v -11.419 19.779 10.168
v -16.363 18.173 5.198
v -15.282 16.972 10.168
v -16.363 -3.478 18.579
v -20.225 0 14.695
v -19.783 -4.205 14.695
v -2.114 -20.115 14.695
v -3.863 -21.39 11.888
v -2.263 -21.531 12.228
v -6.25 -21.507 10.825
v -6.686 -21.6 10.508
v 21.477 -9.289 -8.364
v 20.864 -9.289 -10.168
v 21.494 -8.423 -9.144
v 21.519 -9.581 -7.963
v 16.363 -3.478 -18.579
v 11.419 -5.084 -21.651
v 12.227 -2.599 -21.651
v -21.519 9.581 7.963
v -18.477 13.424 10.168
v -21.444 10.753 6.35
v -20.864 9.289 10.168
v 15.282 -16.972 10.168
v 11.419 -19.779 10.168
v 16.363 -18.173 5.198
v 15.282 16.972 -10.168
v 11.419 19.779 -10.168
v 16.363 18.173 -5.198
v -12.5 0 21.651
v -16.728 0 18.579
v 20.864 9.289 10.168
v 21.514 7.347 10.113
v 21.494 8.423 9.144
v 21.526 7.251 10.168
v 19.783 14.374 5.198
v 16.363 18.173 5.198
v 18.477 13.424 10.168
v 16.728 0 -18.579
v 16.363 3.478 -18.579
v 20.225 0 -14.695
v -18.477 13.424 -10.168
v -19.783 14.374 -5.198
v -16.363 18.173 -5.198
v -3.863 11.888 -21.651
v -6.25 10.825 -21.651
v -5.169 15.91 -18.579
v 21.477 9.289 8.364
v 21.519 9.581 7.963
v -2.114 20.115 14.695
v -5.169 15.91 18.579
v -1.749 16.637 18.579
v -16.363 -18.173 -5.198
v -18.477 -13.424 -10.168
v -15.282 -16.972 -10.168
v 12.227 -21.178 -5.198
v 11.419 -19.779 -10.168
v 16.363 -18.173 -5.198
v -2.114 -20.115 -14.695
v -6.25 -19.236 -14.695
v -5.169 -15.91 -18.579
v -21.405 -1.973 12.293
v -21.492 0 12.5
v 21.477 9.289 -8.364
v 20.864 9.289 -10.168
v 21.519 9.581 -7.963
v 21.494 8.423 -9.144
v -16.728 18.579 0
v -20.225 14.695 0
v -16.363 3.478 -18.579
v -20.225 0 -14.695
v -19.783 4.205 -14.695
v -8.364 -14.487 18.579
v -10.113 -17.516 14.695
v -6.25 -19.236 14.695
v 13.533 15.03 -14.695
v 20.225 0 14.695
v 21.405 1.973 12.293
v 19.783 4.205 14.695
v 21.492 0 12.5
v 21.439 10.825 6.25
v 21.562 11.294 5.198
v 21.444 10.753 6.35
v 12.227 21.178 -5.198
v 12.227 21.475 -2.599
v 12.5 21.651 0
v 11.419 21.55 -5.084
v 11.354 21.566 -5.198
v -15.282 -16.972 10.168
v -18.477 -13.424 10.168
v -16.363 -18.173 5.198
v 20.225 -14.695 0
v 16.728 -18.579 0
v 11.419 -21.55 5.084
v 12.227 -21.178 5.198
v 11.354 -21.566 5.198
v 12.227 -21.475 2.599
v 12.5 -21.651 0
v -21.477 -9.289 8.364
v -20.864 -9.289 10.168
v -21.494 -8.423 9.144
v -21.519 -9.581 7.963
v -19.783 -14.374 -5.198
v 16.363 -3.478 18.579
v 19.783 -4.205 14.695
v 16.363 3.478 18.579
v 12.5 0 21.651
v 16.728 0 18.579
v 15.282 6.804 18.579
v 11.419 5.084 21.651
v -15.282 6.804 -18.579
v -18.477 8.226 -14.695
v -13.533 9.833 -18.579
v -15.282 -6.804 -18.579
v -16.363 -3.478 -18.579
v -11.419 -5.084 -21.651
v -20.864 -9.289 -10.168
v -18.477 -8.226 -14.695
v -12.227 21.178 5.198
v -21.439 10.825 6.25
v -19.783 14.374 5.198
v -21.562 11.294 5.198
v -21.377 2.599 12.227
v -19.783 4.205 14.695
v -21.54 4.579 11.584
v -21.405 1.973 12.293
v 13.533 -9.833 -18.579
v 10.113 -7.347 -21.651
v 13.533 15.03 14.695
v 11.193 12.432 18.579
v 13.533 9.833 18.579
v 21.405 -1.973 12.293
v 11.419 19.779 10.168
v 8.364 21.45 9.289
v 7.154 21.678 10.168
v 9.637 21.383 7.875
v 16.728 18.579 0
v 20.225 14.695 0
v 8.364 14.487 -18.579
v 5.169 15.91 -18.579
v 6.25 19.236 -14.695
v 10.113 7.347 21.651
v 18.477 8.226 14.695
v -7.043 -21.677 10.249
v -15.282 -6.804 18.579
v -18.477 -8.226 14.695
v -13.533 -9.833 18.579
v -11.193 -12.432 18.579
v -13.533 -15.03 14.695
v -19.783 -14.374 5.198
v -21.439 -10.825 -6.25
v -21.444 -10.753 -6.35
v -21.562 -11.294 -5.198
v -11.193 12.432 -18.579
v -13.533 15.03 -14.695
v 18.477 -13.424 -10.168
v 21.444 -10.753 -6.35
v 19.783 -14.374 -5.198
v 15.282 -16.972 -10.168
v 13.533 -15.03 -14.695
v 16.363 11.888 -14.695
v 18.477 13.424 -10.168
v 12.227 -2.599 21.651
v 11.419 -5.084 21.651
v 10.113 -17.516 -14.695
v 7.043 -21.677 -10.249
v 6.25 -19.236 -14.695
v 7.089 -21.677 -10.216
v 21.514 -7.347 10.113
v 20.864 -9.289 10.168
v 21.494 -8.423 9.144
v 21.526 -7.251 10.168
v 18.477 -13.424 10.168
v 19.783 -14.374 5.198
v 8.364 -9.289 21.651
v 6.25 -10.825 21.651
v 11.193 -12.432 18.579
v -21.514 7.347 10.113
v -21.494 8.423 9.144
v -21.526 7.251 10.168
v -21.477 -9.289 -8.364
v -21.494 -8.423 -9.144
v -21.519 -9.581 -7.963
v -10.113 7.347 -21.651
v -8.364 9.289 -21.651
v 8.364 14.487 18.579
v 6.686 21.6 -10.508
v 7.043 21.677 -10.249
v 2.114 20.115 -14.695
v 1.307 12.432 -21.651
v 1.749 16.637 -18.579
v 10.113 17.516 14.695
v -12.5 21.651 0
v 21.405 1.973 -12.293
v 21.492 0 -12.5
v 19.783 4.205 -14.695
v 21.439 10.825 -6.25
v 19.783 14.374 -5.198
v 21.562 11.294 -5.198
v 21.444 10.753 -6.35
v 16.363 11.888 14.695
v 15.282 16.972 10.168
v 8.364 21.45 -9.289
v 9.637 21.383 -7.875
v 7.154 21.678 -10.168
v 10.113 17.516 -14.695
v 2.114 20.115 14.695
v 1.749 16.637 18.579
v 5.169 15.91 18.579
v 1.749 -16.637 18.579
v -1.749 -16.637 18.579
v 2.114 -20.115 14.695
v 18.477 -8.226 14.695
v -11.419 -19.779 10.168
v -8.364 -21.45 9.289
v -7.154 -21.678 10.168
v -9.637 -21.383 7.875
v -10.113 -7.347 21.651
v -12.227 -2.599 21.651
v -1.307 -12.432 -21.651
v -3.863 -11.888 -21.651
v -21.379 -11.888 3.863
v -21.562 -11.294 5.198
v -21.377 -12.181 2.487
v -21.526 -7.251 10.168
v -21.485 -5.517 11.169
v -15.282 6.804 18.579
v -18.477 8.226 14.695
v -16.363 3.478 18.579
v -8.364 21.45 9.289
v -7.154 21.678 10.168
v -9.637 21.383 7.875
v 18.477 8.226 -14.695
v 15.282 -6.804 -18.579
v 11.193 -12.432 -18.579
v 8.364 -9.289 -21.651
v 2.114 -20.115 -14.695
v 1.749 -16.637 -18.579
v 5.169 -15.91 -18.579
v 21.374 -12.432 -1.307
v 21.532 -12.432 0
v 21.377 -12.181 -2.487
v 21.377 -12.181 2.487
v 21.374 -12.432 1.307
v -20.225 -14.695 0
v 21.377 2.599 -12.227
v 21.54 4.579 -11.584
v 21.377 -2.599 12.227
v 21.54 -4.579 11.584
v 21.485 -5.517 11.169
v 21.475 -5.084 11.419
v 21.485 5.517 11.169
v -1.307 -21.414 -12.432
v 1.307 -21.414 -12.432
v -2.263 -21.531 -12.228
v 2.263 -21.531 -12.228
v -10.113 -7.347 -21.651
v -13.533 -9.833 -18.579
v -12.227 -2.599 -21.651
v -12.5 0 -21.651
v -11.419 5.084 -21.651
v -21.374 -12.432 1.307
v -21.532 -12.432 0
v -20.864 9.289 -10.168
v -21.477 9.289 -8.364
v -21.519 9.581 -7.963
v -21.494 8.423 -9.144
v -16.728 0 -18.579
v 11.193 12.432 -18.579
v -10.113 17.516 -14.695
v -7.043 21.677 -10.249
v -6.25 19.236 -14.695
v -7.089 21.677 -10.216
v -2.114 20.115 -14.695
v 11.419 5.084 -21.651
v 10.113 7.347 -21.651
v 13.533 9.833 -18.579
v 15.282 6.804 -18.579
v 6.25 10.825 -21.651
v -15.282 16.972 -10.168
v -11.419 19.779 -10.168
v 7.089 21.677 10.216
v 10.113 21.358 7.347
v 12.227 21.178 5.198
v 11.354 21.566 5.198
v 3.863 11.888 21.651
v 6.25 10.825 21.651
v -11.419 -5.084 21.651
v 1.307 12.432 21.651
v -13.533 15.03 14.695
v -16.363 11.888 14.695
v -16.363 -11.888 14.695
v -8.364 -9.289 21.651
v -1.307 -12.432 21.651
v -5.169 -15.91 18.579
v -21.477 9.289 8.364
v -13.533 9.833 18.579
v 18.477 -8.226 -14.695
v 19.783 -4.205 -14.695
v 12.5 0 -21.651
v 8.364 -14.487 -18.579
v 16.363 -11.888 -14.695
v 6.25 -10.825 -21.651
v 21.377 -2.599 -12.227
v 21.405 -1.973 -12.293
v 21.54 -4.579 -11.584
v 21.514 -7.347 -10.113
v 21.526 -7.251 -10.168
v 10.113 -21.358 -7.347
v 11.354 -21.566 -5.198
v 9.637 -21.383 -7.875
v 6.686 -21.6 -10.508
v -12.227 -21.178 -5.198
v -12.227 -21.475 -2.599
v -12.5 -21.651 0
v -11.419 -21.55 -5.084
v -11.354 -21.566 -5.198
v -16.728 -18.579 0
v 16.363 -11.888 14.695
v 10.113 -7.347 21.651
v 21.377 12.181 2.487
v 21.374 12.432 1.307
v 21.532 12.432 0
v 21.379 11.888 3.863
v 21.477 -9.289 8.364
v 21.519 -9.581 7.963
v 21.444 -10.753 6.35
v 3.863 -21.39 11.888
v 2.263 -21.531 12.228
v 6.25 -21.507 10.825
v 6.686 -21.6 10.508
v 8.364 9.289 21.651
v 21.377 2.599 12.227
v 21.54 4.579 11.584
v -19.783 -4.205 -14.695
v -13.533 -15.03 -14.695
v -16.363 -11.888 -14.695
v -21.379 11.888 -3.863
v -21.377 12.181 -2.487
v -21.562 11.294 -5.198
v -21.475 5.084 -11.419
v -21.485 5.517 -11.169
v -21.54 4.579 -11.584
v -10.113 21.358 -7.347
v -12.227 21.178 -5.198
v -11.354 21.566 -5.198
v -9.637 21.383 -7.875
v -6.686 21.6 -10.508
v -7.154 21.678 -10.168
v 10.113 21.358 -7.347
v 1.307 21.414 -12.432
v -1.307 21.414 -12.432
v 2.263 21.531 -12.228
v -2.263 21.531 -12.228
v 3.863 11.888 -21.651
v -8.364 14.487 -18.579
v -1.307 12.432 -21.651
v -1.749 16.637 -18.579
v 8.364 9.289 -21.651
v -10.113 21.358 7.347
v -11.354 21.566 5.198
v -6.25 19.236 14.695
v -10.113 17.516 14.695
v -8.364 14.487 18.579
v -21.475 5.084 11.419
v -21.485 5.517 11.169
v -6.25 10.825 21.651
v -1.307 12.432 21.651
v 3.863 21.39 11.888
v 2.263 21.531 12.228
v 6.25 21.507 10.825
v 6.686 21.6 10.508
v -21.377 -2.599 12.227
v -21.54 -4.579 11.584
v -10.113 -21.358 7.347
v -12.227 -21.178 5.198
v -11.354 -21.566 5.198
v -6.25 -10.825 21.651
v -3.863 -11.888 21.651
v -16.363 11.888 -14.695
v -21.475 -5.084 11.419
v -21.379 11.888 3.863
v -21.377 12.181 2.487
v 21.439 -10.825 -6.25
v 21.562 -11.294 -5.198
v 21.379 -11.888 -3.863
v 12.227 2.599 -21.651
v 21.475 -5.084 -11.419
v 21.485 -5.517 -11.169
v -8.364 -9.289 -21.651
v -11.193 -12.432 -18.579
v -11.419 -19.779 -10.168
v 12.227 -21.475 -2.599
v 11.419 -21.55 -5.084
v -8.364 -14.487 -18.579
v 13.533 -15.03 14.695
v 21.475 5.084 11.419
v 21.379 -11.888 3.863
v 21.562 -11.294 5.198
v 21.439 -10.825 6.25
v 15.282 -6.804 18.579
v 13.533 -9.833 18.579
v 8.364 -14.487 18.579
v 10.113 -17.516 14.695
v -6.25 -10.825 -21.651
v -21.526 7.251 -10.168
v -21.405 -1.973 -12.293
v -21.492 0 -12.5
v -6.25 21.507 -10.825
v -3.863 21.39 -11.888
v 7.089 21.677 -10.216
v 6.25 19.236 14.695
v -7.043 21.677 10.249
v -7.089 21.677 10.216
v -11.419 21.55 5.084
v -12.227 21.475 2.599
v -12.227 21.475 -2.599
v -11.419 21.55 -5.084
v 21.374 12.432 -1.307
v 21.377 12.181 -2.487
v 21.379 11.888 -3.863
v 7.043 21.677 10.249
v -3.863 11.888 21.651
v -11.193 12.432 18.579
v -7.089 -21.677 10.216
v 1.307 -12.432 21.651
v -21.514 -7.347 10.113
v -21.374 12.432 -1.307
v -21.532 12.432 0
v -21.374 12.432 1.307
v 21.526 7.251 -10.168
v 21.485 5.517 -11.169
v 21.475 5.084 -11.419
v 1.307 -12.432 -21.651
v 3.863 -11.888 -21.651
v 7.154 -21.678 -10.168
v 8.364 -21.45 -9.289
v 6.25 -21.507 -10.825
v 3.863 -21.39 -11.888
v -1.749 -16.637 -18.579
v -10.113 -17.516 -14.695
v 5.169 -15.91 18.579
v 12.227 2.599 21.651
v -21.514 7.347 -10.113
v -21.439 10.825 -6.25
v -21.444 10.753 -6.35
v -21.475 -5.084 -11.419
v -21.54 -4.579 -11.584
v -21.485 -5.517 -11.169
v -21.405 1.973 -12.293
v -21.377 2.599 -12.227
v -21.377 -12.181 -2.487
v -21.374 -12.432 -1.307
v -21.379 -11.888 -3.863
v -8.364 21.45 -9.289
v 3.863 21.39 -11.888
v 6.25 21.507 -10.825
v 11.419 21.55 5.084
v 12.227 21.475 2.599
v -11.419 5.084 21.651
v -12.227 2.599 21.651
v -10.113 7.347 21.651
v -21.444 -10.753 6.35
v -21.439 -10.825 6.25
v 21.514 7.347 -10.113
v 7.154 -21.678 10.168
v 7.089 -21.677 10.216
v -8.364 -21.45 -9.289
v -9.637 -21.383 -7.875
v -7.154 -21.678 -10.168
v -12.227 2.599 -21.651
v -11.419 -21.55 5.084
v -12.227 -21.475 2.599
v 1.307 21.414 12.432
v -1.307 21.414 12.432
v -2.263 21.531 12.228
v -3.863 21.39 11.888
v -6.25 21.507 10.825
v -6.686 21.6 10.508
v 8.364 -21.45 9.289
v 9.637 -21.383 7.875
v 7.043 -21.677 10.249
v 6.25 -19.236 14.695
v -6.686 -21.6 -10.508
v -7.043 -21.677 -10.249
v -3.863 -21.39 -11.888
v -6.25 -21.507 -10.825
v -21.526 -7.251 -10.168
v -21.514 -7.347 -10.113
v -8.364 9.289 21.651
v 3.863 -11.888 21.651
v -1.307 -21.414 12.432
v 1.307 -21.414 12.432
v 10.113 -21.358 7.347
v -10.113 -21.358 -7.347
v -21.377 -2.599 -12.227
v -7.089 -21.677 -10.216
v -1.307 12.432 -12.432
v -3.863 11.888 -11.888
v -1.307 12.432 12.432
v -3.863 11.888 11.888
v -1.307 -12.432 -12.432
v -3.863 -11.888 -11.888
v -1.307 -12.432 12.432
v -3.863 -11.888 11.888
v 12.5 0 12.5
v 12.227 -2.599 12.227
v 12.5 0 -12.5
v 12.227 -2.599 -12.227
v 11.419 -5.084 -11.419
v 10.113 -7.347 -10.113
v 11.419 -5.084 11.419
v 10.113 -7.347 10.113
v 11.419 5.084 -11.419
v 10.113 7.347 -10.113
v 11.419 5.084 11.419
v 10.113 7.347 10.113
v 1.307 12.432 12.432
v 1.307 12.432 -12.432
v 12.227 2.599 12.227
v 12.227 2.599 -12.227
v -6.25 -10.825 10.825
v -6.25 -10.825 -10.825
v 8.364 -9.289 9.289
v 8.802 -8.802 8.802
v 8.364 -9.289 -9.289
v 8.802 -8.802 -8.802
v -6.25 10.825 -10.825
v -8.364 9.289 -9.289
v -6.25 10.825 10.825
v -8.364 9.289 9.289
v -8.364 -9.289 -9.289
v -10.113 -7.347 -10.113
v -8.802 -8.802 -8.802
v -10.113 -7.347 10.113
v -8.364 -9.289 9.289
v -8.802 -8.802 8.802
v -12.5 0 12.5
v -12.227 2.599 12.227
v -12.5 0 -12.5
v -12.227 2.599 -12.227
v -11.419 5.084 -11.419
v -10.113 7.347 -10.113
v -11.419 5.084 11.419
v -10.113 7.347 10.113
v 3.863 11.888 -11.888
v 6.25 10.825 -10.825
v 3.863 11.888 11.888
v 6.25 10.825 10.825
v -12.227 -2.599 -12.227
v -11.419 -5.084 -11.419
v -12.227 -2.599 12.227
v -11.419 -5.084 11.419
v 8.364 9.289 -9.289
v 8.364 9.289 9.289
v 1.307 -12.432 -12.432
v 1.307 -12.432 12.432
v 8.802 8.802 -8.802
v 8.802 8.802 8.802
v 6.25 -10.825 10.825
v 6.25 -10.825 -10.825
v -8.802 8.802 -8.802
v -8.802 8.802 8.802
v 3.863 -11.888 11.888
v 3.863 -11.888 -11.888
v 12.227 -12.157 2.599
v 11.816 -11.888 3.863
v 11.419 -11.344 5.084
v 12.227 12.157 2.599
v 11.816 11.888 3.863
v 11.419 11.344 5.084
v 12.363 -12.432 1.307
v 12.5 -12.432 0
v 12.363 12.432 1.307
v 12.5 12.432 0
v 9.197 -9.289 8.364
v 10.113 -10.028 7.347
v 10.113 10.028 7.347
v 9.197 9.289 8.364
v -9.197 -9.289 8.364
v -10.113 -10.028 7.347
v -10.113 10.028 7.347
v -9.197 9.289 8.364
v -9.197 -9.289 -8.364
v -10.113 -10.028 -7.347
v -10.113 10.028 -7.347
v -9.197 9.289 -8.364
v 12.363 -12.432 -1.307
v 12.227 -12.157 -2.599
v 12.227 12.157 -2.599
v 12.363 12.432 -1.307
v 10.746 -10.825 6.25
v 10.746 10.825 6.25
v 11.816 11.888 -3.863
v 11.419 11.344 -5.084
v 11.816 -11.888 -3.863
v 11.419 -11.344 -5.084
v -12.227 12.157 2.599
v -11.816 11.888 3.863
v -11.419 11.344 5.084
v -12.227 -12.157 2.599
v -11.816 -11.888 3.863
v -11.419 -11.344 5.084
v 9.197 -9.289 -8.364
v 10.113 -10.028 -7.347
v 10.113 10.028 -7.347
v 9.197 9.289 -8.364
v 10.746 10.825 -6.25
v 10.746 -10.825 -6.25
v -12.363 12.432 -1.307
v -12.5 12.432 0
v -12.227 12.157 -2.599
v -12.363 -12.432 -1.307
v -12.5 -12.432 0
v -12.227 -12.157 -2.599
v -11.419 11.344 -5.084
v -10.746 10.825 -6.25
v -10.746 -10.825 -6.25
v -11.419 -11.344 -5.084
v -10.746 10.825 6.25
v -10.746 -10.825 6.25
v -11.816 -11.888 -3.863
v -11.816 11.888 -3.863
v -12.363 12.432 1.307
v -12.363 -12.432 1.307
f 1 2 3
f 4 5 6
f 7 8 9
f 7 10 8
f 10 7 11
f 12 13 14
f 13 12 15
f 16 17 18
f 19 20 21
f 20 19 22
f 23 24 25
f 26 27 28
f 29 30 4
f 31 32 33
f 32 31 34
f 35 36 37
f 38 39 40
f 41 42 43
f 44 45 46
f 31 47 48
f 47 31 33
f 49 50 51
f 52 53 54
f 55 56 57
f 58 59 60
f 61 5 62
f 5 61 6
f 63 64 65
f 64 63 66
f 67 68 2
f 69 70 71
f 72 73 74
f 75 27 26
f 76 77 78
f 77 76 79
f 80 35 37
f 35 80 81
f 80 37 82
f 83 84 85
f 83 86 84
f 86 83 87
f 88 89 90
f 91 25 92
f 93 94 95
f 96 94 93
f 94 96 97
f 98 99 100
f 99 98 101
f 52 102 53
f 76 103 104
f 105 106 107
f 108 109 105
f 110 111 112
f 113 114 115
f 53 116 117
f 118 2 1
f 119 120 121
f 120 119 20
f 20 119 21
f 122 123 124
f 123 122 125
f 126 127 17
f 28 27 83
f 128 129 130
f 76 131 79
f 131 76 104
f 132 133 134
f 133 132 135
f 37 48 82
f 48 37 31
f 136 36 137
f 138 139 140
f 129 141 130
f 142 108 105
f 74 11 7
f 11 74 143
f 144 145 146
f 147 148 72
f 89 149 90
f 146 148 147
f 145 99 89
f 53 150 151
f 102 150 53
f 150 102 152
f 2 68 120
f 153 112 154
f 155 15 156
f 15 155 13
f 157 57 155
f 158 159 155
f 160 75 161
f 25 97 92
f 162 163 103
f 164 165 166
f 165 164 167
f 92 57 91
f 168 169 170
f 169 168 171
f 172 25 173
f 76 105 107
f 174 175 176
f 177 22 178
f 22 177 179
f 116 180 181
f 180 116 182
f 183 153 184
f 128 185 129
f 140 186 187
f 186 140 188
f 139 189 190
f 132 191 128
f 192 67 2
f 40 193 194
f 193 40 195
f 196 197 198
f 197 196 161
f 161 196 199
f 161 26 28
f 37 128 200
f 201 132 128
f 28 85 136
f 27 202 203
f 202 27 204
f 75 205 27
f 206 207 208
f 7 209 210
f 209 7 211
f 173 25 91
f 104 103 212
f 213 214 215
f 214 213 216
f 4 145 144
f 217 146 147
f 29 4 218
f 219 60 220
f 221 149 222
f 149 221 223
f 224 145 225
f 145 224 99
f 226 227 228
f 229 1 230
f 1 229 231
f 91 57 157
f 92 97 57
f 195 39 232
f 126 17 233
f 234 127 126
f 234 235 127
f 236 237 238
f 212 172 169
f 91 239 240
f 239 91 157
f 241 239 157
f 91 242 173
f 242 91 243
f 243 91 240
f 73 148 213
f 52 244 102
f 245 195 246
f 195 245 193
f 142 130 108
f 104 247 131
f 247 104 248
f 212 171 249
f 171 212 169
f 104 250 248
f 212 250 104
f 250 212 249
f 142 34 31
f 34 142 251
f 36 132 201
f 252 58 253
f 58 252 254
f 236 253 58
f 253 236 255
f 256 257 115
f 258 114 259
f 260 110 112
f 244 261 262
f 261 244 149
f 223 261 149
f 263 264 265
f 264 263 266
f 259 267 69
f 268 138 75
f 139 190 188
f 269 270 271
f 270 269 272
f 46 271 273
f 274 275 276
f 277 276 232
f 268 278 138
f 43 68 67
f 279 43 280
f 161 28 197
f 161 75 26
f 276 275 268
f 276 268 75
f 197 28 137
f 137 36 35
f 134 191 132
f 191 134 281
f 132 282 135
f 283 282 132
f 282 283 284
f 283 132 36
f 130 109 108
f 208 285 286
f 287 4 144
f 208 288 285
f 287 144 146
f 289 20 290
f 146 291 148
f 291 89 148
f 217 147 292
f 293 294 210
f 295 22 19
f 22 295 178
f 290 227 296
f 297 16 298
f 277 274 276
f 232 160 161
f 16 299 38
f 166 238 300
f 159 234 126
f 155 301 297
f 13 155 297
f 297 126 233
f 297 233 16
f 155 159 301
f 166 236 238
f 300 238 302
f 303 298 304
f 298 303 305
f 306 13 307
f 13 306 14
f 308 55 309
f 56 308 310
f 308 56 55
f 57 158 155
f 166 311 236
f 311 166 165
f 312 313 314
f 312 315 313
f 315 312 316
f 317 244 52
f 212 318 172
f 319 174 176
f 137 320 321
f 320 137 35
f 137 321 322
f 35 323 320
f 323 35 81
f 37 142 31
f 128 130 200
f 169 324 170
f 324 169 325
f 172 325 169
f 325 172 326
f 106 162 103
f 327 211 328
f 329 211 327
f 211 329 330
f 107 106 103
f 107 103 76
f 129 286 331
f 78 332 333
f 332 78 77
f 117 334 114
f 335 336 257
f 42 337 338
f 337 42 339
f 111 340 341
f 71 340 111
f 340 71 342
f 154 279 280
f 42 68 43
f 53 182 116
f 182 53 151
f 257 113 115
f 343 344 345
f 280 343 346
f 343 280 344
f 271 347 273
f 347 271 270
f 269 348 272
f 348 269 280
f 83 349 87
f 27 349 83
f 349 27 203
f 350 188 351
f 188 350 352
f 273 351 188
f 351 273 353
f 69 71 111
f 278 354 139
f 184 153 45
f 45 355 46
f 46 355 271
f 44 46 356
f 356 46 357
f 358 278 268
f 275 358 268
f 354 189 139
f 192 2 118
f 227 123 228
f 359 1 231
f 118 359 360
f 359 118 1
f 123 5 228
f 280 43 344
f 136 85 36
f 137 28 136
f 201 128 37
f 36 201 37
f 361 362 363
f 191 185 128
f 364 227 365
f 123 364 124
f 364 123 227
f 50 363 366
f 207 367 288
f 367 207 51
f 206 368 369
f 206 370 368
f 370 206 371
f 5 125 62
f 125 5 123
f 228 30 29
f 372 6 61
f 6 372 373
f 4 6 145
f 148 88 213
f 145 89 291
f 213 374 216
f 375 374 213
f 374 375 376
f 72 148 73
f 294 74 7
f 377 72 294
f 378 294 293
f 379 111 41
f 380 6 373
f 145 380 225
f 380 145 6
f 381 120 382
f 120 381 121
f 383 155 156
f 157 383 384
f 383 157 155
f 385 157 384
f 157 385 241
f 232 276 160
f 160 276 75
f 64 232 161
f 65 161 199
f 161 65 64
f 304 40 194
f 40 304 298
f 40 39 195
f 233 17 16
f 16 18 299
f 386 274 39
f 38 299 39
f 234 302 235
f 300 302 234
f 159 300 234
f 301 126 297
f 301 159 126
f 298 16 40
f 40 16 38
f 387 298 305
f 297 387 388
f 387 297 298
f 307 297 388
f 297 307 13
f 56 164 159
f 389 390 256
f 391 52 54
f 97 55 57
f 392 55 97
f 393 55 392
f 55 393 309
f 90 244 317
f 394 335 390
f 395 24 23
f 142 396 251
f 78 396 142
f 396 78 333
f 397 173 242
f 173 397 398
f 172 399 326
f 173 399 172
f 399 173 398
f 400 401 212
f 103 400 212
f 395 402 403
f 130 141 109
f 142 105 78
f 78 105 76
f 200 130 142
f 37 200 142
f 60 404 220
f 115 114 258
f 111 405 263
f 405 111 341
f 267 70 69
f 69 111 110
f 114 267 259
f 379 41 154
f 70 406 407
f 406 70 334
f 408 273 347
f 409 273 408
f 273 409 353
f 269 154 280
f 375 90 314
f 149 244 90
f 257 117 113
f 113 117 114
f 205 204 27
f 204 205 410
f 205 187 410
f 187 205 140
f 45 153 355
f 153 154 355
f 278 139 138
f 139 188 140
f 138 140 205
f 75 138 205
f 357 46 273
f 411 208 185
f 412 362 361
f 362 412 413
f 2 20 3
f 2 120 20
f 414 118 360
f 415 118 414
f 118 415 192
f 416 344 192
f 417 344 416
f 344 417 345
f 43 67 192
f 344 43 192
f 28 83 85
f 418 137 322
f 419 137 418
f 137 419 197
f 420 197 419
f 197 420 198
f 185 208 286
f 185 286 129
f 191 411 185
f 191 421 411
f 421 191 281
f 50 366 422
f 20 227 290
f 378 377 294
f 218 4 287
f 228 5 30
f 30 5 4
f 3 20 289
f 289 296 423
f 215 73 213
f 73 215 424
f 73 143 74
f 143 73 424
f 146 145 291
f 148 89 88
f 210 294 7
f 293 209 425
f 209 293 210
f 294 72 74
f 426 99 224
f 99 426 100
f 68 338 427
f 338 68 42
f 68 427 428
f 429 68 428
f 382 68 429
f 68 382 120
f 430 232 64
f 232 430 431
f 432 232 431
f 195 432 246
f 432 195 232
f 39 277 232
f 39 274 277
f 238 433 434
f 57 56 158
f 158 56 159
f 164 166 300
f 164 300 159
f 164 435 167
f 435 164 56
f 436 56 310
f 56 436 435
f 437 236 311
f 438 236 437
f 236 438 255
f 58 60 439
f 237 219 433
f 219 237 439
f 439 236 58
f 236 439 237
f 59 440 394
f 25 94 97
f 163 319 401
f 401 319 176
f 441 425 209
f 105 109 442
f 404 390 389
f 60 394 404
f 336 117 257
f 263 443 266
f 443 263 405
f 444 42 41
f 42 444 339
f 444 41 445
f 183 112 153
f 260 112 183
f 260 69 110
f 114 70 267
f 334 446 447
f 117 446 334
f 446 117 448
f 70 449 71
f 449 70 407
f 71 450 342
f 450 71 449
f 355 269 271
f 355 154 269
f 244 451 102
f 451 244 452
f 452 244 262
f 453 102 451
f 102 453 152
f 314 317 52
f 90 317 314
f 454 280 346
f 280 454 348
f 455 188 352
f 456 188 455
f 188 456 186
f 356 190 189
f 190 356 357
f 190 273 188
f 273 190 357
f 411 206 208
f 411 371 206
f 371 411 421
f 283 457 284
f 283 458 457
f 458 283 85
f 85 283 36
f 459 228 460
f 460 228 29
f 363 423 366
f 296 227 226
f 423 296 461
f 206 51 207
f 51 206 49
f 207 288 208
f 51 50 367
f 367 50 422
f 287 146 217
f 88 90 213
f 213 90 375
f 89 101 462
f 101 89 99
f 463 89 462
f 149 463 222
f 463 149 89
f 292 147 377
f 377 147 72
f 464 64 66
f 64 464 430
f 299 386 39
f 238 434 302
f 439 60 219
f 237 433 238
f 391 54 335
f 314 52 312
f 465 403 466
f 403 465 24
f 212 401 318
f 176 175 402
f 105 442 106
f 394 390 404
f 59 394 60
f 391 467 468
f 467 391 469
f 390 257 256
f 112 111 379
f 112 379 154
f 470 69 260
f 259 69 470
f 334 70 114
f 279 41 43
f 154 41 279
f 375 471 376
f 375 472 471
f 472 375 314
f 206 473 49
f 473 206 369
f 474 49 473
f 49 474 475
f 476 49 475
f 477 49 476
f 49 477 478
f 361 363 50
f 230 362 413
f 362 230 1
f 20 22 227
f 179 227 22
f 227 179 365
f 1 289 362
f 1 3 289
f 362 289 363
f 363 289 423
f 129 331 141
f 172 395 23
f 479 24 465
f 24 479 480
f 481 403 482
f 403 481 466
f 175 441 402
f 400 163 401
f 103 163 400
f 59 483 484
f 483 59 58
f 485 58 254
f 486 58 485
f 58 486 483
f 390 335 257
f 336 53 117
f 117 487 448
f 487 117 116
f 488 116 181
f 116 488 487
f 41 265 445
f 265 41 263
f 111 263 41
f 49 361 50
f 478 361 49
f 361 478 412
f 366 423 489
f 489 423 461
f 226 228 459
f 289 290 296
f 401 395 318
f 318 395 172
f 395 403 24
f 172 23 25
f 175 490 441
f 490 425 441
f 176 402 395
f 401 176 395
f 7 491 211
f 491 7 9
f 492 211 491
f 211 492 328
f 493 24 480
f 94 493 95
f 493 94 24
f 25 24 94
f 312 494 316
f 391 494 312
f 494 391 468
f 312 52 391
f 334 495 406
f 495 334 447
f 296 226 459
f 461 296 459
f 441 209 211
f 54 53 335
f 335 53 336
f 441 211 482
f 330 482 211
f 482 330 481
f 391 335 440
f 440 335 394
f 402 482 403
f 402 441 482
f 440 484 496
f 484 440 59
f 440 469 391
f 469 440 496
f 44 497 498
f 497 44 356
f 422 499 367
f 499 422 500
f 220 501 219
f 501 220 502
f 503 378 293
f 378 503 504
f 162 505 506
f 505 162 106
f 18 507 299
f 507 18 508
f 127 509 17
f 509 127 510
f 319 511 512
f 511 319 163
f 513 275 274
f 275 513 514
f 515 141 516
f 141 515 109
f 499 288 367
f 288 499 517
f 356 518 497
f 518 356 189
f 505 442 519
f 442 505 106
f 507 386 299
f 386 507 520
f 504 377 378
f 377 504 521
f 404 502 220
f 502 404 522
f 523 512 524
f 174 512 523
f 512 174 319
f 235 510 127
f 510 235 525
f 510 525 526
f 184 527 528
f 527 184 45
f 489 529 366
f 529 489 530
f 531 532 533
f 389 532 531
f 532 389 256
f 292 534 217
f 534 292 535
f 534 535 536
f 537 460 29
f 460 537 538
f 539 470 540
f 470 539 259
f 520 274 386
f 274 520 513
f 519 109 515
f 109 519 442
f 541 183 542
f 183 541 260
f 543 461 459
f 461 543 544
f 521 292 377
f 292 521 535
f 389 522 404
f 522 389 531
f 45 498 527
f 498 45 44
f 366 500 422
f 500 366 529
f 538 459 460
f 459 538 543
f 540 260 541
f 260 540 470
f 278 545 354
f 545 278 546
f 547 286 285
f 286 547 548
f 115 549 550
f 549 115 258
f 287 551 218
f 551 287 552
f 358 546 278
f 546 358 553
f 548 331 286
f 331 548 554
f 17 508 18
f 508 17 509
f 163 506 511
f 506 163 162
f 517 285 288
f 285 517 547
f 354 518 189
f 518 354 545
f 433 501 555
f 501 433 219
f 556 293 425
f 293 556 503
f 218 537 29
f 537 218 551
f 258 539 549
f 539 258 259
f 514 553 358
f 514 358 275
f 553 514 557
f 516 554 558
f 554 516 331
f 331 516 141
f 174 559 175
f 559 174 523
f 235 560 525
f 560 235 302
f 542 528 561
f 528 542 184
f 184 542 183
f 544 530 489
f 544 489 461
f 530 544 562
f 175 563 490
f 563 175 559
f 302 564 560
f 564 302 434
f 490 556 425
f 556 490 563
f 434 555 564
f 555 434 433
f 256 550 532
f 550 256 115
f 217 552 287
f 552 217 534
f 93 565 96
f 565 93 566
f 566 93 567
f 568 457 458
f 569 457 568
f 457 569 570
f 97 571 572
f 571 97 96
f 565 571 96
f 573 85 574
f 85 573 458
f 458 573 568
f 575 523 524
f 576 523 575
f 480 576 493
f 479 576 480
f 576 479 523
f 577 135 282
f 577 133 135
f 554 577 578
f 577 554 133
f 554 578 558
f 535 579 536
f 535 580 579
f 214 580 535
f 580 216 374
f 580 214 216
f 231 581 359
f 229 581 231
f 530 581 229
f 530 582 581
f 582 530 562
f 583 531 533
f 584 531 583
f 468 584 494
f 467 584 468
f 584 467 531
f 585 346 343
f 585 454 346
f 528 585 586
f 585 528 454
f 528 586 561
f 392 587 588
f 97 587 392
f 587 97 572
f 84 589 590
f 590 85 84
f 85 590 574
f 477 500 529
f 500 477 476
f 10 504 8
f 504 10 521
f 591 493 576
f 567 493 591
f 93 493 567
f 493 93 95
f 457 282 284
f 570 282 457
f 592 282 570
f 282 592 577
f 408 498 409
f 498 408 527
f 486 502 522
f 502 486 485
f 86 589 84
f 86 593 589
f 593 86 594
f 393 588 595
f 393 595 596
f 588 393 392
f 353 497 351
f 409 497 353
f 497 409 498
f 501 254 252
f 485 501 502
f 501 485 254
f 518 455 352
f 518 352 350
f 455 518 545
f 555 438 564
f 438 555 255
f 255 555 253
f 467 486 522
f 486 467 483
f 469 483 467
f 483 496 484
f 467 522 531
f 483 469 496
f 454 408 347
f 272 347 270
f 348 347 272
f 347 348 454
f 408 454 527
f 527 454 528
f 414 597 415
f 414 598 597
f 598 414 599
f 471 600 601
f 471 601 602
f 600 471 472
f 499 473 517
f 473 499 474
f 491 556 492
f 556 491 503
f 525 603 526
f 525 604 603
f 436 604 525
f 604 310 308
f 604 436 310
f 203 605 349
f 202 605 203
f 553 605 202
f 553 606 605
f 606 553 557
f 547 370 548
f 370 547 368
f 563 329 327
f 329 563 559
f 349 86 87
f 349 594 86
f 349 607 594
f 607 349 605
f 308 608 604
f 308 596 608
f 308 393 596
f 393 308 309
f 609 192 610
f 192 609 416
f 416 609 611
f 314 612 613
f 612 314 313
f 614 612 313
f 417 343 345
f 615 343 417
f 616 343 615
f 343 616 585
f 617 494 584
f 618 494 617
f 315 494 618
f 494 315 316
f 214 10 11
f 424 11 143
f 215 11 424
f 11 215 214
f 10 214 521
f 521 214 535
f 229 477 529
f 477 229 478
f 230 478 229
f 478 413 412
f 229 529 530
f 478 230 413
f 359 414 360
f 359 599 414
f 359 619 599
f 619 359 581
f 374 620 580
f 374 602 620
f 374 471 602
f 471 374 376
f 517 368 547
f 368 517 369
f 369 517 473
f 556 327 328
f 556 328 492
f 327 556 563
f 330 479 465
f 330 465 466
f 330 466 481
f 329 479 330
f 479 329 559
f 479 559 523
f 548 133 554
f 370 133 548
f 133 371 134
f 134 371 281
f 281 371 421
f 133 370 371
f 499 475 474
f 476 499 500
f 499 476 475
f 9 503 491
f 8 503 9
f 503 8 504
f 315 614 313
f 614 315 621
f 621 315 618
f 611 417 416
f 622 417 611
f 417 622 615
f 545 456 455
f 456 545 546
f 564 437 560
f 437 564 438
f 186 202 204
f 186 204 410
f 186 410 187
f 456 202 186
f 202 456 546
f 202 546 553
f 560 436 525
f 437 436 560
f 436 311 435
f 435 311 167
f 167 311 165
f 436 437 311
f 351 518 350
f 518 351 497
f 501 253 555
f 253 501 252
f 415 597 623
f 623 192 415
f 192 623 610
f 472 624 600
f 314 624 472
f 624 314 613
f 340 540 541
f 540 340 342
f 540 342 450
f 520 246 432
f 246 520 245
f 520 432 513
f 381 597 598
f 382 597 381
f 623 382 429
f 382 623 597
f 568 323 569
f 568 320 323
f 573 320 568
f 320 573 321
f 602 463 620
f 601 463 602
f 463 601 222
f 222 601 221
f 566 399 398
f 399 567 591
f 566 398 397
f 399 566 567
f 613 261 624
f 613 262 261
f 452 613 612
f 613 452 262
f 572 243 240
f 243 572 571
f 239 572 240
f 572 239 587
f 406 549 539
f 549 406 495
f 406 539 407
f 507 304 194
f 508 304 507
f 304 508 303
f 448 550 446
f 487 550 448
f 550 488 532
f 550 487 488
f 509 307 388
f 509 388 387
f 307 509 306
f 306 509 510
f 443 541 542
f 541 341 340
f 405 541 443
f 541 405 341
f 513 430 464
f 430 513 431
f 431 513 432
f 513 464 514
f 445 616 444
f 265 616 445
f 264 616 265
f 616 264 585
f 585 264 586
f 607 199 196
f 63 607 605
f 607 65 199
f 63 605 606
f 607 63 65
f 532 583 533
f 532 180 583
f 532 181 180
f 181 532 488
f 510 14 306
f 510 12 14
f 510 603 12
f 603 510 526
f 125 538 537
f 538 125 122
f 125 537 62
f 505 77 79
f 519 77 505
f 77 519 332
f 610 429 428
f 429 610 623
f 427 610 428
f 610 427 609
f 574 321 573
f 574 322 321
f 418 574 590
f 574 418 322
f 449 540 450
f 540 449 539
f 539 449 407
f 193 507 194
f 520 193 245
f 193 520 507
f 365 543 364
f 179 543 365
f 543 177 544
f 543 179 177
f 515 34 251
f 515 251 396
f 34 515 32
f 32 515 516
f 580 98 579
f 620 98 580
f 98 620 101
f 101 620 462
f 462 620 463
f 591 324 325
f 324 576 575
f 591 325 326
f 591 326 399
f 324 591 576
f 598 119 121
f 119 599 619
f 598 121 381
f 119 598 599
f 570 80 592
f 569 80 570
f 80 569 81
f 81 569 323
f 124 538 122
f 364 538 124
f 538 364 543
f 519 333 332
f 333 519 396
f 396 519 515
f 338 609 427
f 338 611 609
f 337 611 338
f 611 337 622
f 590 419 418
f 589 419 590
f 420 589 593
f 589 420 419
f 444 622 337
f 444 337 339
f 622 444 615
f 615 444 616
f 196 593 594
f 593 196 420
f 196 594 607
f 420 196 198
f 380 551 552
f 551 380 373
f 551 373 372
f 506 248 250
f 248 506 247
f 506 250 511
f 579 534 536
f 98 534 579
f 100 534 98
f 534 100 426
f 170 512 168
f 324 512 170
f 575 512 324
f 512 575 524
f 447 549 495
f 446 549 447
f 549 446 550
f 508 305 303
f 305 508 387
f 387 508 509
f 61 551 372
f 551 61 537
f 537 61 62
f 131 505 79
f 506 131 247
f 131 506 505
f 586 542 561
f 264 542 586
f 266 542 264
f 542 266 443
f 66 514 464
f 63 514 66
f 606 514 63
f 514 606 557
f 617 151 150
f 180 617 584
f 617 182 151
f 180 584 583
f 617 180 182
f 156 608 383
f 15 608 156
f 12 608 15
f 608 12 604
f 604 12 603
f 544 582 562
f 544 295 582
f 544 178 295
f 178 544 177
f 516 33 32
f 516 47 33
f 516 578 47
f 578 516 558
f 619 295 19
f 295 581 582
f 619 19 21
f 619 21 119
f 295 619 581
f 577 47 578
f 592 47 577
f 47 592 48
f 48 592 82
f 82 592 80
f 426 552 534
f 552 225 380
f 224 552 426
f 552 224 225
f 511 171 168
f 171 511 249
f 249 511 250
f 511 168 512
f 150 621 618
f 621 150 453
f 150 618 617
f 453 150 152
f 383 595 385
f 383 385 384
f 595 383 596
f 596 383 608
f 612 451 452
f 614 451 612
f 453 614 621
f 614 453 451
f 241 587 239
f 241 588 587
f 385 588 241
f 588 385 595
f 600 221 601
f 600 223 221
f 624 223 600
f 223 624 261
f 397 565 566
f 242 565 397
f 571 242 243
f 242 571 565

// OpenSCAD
// difference_sphere.scad - Example for difference() usage in OpenSCAD

echo(version=version());

module difference_sphere()
{
	function r_from_dia(d) = d / 2;

	module rotcy(rot, r, h) {
		rotate(90, rot)
			cylinder(r = r, h = h, center = true);
	}

	difference() {
		sphere(r = r_from_dia(size));
		rotcy([0, 0, 0], cy_r, cy_h);
		rotcy([1, 0, 0], cy_r, cy_h);
		rotcy([0, 1, 0], cy_r, cy_h);
	}

	size = 50;
	hole = 25;

	cy_r = r_from_dia(hole);
	cy_h = r_from_dia(size * 2.5);
}

difference_sphere();



// Written by Clifford Wolf &ltclifford@clifford.at> and Marius
// Kintel &ltmarius@kintel.net>
//
// To the extent possible under law, the author(s) have dedicated all
// copyright and related and neighboring rights to this software to the
// public domain worldwide. This software is distributed without any
// warranty.
//
// You should have received a copy of the CC0 Public Domain
// Dedication along with this software.
// If not, see &lthttp://creativecommons.org/publicdomain/zero/1.0/&gt.
